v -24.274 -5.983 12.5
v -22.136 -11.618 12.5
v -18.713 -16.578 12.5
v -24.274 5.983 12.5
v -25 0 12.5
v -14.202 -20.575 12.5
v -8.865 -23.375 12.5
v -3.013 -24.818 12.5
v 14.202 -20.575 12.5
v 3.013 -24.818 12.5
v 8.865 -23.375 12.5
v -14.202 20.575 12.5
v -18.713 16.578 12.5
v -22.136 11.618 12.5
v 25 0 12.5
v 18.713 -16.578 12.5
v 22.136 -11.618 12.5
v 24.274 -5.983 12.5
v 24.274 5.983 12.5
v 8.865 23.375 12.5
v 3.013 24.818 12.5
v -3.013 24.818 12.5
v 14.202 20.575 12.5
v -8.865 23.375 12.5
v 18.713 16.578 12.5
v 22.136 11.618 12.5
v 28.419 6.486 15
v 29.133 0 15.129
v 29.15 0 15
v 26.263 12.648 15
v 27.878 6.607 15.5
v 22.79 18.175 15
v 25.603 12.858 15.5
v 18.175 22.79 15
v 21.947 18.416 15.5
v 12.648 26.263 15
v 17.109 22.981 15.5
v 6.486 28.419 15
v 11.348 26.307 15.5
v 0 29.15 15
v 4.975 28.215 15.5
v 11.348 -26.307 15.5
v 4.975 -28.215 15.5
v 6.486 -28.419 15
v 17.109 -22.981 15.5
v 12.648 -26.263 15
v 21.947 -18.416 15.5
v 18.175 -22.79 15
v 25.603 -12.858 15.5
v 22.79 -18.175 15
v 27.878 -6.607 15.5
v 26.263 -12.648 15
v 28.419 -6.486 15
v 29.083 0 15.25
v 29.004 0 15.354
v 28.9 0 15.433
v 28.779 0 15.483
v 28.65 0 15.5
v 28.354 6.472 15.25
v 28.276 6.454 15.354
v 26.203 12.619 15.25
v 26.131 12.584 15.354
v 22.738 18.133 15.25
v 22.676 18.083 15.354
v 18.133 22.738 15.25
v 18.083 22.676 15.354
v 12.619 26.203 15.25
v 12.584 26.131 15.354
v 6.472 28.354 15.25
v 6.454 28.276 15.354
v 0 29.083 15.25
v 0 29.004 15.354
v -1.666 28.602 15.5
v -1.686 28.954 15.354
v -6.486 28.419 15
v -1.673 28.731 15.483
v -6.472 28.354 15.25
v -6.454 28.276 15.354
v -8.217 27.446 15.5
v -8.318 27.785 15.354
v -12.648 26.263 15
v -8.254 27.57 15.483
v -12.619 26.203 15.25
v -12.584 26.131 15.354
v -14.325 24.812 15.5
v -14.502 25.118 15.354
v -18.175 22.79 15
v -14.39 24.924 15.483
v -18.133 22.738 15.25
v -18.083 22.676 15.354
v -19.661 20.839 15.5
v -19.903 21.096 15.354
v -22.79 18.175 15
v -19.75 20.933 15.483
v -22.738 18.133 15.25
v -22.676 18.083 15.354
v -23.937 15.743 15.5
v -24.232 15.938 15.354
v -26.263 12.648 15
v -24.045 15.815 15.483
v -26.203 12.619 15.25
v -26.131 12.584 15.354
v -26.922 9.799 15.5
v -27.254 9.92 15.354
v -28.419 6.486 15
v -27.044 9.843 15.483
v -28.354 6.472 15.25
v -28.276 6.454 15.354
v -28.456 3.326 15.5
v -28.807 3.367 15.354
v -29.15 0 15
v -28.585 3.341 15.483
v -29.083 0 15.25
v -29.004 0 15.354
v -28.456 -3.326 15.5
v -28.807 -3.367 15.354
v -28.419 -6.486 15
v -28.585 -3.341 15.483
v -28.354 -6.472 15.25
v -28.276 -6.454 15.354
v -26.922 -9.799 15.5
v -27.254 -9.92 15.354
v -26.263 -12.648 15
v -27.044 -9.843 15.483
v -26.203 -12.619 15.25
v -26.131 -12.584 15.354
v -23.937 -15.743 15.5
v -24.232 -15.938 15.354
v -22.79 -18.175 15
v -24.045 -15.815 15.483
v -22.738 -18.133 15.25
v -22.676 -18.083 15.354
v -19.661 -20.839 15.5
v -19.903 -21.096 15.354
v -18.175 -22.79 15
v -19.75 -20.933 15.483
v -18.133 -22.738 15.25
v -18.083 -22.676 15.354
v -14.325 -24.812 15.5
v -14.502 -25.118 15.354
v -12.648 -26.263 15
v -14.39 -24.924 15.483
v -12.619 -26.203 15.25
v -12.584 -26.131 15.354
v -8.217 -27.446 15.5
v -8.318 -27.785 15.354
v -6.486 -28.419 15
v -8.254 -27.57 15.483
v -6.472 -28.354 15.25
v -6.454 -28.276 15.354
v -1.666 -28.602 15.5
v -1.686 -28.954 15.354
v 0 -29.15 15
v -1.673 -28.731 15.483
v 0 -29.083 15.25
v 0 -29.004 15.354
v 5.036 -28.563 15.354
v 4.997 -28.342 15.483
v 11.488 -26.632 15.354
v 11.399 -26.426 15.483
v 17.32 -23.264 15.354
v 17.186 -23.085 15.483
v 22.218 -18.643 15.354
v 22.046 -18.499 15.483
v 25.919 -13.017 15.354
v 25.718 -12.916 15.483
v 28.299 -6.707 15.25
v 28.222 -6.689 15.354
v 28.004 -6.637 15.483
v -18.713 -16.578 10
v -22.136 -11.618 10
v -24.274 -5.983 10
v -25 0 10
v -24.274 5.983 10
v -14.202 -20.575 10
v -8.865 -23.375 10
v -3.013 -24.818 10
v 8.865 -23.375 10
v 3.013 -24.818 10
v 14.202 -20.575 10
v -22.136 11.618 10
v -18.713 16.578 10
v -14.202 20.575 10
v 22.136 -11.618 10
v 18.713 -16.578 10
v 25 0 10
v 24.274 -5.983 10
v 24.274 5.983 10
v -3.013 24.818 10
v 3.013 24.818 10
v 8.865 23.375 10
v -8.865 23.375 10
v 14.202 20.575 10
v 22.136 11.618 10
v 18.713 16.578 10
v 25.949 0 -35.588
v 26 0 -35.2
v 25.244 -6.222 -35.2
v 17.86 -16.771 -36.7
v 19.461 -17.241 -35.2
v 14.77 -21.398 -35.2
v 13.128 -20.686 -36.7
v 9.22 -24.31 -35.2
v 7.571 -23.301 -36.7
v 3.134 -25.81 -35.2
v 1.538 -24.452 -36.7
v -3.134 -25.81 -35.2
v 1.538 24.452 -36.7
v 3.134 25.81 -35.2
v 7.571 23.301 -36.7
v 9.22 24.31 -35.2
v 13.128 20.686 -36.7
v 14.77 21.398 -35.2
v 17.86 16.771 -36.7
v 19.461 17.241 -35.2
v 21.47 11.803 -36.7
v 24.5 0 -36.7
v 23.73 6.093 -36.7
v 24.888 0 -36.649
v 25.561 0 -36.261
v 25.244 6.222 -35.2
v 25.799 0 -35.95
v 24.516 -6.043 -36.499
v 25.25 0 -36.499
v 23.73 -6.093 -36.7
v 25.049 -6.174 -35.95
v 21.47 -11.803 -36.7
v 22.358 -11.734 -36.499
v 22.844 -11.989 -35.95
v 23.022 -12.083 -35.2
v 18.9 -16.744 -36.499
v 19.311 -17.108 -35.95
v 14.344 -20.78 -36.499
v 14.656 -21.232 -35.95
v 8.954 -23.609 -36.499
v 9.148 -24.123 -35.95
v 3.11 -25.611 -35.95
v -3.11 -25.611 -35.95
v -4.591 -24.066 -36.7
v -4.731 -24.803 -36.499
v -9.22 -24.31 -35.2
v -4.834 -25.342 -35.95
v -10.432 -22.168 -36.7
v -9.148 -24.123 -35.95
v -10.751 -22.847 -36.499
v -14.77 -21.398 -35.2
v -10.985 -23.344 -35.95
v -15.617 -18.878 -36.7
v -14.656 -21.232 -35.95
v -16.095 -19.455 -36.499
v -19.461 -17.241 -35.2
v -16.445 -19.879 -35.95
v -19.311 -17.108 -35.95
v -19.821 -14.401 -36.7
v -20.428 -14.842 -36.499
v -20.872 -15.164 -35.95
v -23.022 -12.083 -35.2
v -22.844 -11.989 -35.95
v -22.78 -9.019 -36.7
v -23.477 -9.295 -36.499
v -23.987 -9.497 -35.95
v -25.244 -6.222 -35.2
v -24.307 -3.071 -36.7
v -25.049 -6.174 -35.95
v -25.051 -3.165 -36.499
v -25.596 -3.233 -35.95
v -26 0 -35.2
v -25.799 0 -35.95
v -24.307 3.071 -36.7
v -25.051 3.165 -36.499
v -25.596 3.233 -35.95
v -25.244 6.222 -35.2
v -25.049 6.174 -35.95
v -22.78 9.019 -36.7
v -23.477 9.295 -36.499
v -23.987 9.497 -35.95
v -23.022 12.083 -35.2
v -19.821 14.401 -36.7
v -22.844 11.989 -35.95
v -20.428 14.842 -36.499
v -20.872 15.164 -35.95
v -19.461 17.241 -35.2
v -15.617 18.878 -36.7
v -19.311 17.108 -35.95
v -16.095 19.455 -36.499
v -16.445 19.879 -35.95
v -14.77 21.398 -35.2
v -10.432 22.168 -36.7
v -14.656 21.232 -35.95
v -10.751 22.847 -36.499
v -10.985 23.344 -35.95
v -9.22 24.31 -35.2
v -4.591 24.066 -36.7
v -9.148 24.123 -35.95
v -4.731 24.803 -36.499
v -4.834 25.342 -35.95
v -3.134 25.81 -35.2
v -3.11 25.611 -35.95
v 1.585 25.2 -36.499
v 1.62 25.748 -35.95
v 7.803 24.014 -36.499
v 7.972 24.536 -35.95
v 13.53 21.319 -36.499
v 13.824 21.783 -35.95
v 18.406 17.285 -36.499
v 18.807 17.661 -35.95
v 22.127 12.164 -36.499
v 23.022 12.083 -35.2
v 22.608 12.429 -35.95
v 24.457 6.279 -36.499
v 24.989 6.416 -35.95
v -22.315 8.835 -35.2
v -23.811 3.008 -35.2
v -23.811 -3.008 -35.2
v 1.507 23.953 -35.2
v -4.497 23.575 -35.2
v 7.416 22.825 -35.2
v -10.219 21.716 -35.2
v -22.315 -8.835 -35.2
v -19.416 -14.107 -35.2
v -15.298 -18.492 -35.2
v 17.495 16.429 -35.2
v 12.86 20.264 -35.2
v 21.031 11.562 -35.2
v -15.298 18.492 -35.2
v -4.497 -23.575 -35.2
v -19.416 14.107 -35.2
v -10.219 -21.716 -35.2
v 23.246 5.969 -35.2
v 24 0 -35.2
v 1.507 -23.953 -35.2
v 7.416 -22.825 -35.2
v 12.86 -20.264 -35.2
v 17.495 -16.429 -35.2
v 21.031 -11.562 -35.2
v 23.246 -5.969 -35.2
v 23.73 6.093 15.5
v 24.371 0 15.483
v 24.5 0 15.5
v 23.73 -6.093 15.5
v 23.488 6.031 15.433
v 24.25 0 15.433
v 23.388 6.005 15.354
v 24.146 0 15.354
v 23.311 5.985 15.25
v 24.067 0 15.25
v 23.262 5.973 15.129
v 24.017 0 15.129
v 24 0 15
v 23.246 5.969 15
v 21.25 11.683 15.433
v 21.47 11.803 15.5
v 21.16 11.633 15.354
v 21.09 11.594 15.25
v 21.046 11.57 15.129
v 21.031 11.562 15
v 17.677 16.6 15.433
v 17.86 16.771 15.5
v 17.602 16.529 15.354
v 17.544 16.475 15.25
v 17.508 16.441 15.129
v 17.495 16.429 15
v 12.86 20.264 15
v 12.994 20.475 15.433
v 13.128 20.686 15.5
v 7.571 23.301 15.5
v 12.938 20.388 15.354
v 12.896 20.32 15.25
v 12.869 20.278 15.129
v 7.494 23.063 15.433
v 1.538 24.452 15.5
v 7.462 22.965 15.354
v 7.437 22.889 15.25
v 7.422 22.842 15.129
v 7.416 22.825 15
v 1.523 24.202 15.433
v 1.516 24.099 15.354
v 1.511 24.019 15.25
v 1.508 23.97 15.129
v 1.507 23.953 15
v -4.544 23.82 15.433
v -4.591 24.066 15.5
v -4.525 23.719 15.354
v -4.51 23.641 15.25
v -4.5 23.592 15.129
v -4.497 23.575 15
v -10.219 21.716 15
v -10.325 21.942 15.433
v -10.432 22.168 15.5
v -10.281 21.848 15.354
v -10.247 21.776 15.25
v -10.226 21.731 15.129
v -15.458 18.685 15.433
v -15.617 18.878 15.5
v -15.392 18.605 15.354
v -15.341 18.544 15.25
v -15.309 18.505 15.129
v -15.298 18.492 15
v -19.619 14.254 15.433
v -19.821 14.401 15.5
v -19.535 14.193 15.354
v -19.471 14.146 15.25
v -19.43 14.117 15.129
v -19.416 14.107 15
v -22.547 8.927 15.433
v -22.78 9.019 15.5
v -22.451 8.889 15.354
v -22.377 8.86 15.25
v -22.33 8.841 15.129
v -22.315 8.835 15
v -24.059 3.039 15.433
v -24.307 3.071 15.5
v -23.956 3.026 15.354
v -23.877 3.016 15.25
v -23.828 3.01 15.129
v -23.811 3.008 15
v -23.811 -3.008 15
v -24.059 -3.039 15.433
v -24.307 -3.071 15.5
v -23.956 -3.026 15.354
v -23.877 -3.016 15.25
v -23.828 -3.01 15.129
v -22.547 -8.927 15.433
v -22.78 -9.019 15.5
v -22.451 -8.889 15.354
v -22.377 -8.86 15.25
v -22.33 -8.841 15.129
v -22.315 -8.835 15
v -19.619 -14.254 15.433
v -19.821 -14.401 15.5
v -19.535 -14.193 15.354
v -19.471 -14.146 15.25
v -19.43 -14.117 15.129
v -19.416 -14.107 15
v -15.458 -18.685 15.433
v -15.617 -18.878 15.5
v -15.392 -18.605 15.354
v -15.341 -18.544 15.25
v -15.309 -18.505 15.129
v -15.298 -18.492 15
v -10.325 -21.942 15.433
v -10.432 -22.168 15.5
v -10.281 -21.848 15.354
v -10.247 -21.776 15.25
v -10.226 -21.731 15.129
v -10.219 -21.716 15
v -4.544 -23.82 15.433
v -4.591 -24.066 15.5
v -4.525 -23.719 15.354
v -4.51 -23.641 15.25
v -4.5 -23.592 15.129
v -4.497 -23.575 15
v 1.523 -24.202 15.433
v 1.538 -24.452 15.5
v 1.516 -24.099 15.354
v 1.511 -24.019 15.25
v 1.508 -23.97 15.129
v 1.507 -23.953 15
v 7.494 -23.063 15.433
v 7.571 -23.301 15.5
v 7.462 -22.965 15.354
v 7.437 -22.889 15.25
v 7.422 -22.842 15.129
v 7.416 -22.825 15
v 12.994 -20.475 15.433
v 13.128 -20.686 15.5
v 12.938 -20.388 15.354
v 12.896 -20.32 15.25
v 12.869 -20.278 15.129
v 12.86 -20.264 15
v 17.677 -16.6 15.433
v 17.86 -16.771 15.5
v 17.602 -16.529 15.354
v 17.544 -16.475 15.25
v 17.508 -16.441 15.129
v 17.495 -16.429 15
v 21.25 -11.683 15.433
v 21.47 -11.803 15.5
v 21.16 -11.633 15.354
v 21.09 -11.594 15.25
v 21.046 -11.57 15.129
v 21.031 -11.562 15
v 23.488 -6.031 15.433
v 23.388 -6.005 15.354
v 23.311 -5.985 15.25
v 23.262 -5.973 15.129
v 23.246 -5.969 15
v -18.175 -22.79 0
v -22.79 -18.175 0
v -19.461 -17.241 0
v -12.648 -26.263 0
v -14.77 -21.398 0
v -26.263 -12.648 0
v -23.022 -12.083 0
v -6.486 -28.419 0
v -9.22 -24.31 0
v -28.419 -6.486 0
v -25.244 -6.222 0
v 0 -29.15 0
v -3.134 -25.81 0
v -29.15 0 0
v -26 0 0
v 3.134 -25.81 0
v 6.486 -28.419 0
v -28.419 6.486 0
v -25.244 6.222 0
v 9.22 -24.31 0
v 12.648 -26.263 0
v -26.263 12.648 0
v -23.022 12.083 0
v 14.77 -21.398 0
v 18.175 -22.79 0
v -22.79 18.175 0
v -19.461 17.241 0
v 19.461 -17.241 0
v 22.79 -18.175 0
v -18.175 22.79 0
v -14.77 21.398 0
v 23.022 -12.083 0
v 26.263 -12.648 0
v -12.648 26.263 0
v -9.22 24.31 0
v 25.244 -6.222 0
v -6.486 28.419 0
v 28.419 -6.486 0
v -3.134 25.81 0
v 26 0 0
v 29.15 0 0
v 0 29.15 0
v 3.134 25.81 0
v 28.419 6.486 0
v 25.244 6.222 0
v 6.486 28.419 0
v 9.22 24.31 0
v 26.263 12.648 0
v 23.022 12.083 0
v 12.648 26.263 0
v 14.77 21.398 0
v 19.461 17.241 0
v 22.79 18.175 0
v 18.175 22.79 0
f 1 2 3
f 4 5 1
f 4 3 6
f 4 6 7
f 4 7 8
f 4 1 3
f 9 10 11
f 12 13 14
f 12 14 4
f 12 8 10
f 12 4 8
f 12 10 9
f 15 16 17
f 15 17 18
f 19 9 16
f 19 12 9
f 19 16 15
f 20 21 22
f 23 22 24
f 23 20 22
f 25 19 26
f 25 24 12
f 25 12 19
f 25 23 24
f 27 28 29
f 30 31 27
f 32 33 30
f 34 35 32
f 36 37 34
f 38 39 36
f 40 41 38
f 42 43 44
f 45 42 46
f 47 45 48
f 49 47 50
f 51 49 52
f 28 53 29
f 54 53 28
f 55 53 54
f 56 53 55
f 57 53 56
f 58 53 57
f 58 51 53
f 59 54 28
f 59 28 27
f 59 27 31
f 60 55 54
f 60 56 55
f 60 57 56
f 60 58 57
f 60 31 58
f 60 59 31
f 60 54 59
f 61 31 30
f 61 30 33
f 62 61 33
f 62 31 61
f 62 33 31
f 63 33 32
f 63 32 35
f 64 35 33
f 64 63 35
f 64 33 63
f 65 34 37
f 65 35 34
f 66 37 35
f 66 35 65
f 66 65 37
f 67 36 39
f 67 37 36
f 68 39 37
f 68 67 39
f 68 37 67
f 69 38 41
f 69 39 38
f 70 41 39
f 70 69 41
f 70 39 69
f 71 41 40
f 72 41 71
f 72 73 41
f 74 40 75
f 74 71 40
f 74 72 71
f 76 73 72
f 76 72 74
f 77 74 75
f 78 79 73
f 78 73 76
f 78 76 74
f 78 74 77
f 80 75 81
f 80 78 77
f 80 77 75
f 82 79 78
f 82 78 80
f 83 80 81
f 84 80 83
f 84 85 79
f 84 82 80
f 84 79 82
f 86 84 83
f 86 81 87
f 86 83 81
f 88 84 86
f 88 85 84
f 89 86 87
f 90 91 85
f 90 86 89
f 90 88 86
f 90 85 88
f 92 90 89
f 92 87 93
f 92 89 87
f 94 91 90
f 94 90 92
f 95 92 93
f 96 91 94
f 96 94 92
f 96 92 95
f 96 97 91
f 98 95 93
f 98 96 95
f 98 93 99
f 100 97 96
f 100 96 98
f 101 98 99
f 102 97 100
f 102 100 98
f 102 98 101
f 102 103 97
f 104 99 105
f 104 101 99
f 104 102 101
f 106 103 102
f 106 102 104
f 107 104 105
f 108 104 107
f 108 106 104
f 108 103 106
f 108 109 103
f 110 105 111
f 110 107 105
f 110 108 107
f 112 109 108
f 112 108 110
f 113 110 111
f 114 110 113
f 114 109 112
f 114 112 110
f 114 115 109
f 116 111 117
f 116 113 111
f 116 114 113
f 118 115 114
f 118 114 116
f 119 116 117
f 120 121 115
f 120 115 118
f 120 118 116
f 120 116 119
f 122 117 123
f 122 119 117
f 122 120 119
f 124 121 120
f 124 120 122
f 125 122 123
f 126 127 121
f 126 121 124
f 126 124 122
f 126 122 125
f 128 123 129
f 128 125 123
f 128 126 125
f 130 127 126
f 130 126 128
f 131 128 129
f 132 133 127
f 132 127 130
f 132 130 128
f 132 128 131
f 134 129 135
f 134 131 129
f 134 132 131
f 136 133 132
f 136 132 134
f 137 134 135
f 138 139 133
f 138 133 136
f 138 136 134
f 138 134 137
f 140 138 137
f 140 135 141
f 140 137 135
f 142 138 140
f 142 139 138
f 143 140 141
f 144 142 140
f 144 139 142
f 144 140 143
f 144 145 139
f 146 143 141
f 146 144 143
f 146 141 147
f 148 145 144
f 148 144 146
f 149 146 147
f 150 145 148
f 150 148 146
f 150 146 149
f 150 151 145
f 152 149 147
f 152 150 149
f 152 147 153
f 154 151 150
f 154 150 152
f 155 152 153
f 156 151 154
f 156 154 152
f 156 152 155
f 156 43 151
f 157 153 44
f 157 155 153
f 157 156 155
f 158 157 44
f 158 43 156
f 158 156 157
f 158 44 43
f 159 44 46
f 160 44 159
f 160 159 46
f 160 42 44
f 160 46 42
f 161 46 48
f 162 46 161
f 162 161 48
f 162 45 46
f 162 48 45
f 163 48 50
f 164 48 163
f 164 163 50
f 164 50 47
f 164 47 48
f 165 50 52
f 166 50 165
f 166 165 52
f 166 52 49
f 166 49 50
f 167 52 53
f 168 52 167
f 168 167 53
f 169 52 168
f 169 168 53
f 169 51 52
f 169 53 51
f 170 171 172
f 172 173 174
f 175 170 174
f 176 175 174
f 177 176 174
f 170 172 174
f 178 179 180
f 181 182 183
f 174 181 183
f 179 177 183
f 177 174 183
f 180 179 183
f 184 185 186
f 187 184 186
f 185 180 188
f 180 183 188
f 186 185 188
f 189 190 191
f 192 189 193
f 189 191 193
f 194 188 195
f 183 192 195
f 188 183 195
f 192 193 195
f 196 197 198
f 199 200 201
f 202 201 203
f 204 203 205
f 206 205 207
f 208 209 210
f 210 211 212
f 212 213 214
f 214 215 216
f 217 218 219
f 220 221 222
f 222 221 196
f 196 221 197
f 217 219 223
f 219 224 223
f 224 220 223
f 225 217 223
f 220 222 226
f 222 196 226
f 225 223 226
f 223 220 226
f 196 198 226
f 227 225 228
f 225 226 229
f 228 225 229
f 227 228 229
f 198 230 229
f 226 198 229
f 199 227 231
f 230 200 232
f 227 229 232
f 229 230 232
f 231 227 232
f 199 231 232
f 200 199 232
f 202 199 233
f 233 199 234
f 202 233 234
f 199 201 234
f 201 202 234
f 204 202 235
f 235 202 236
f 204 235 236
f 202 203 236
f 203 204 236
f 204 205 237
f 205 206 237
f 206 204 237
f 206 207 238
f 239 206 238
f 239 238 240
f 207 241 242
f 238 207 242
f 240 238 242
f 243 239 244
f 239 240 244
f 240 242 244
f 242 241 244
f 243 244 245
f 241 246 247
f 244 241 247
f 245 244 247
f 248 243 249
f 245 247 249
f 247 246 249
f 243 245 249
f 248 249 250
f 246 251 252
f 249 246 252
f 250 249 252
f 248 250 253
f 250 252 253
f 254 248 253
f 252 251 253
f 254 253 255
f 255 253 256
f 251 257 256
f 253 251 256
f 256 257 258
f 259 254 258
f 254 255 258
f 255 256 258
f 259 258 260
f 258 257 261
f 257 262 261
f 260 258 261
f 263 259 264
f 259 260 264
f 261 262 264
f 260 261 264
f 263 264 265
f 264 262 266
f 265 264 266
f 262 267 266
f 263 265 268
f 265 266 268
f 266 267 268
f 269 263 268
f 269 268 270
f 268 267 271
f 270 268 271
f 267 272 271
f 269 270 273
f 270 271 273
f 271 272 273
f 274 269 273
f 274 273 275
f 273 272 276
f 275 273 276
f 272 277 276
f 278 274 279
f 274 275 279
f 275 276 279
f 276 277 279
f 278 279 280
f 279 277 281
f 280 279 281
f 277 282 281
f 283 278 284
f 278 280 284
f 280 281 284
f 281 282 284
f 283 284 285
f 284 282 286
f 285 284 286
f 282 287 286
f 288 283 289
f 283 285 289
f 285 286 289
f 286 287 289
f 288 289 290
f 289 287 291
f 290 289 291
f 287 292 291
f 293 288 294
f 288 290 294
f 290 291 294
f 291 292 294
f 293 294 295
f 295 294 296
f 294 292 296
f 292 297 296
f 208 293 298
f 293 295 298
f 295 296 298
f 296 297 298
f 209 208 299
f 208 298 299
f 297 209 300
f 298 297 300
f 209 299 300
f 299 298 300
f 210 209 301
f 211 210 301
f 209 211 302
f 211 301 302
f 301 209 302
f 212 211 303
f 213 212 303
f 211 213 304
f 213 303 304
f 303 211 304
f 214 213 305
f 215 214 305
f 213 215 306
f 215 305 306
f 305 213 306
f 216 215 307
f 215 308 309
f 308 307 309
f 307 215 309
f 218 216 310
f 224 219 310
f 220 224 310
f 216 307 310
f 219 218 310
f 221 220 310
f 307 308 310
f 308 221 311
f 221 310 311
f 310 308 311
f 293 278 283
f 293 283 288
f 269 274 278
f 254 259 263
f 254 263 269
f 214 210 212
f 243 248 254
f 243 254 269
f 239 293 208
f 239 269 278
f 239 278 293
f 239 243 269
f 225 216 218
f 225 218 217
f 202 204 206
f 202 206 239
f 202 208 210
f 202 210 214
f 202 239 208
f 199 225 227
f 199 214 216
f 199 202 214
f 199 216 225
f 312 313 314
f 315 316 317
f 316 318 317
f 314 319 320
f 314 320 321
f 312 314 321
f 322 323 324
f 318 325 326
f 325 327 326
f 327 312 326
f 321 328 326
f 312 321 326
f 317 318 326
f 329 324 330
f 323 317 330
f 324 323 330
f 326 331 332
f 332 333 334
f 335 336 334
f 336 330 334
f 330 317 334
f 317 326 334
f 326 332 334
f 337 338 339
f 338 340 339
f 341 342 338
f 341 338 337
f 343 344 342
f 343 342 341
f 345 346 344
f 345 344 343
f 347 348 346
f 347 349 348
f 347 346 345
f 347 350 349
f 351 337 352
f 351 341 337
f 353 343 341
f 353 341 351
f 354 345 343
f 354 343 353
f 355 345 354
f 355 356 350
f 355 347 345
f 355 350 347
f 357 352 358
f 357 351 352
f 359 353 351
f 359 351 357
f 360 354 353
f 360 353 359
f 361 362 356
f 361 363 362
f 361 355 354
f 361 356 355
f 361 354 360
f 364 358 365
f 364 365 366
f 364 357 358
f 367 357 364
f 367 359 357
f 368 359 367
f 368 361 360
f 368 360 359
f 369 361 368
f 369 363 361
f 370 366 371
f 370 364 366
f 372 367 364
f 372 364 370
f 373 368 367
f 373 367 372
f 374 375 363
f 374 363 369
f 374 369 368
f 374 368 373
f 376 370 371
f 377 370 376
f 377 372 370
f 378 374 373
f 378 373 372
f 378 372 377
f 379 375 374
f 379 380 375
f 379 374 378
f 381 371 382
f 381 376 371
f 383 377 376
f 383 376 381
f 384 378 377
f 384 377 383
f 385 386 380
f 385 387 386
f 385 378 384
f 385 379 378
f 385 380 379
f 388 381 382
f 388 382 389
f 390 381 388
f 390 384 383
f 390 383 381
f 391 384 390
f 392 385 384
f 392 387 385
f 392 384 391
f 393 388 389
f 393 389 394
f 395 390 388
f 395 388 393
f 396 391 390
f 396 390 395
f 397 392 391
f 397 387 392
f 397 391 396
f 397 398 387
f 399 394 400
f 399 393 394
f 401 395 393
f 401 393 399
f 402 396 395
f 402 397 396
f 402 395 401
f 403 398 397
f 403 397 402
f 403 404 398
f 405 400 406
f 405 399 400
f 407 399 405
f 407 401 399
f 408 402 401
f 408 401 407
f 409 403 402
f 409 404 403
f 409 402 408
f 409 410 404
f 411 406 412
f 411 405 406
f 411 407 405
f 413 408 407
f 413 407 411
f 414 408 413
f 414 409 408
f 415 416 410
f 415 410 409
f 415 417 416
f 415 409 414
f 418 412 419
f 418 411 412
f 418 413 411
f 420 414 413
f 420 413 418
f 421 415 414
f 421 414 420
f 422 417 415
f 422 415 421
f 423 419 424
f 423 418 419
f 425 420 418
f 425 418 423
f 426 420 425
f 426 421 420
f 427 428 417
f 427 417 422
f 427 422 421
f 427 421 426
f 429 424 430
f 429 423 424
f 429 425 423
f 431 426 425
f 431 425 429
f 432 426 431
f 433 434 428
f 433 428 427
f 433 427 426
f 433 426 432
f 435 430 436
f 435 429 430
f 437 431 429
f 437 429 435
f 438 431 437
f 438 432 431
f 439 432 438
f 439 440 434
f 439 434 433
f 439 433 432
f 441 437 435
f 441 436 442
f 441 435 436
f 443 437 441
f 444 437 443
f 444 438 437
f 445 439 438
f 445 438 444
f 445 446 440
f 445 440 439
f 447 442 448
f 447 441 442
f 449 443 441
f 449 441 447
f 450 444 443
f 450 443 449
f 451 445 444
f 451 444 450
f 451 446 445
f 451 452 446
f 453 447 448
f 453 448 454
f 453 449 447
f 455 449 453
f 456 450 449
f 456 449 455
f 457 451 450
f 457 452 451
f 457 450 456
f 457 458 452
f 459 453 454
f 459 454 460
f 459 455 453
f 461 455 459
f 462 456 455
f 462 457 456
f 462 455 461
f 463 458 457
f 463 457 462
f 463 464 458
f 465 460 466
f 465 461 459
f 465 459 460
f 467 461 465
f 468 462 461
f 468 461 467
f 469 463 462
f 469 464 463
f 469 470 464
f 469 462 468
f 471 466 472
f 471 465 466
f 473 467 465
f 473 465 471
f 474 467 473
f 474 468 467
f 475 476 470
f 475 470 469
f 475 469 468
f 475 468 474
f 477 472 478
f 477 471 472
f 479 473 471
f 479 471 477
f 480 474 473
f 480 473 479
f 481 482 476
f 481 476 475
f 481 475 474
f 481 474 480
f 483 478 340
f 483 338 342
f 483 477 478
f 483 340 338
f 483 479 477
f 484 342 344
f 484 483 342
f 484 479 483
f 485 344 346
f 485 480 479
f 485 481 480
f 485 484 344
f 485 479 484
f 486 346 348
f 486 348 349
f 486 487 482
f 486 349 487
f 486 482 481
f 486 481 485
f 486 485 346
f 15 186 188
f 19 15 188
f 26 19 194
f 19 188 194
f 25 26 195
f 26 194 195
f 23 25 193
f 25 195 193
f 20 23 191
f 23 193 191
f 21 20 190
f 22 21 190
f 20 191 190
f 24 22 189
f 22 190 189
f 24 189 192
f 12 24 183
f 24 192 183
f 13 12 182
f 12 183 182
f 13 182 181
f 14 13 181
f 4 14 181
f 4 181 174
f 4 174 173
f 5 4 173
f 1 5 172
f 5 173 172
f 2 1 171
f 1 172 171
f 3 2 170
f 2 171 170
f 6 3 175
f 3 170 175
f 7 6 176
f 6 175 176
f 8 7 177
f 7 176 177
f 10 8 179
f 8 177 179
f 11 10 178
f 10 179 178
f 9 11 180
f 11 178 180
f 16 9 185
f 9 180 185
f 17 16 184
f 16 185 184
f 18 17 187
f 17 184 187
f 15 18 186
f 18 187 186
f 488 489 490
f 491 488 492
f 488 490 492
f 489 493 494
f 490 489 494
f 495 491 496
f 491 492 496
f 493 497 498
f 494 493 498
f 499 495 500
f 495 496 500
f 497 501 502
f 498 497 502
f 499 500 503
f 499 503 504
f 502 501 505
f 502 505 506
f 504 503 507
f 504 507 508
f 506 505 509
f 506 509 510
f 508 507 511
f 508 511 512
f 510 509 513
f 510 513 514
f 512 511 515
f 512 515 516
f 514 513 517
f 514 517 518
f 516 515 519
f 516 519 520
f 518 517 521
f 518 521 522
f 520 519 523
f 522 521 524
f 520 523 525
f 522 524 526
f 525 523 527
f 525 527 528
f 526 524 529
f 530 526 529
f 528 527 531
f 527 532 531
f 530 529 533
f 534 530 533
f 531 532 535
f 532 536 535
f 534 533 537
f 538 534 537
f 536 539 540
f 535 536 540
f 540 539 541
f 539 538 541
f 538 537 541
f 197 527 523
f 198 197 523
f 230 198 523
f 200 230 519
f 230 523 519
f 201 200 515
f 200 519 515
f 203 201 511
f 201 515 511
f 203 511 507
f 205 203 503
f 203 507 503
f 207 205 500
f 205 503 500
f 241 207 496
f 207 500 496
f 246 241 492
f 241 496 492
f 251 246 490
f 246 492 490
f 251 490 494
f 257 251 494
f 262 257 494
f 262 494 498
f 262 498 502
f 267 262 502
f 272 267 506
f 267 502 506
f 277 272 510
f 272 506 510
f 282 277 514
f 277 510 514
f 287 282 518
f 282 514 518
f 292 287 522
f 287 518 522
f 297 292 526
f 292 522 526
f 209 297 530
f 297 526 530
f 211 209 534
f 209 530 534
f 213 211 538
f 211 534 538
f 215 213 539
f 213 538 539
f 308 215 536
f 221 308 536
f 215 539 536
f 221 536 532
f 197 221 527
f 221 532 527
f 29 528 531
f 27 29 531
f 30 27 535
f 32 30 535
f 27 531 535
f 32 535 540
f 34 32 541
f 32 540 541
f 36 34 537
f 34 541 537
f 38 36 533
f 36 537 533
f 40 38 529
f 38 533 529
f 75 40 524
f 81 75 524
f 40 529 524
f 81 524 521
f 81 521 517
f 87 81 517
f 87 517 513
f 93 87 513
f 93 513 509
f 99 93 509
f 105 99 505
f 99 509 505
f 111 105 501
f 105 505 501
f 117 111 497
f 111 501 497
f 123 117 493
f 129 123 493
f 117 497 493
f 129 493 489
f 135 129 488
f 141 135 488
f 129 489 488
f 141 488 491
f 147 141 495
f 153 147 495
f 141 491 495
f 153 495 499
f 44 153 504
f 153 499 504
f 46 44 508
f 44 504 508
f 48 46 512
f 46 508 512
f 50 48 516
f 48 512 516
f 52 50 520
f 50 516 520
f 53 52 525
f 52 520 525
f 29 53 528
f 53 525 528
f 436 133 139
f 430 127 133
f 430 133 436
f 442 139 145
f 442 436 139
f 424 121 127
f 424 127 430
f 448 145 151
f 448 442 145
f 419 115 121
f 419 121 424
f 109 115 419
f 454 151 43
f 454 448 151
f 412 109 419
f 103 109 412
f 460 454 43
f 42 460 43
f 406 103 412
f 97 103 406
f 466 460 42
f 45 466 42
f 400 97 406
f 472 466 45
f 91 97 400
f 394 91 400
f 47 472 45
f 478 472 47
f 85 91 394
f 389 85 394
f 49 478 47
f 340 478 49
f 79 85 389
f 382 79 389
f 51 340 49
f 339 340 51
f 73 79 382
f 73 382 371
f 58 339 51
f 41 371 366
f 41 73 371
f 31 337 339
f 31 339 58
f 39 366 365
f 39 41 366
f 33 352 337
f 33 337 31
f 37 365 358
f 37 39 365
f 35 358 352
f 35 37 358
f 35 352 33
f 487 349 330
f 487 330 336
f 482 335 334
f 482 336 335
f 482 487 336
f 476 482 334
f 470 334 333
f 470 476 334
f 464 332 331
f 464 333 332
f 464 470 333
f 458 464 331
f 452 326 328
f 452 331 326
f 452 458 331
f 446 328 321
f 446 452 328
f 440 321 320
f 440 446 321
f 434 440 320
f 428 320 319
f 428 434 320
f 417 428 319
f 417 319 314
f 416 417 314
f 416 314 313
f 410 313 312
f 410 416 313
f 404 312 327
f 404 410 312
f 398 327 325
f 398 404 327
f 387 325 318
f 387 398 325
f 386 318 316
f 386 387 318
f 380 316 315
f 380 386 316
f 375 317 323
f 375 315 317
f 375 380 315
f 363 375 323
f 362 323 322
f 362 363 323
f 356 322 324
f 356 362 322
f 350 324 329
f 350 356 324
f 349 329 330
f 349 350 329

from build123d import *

# Parameters (mm, degrees)
F0_R     = 29.15
F0_R_2   = 24
F1_DEPTH = 15.5
F3_R     = 25
F4_DEPTH = 2.5
F5_R     = 26
F5_R_2   = 24
F6_DEPTH = 36.7
F7_R     = 25.5
F8_DEPTH = 1.5
F9_R     = 1.5
F10_R    = 0.5


with BuildPart() as f1:
    # F0 (on Top) → F1 (new body)
    with BuildSketch(Plane.XY):
        Circle(F0_R)
        Circle(F0_R_2, mode=Mode.SUBTRACT)
    extrude(amount=F1_DEPTH)

    # F5 (on face) → F6 (join)
    with BuildSketch(Plane(origin=(0, 0, 0), x_dir=(1, 0, 0), z_dir=(0, 0, -1))):
        Circle(F5_R)
        Circle(F5_R_2, mode=Mode.SUBTRACT)
    extrude(amount=F6_DEPTH)

    # F7 (on face) → F8 (join)
    with BuildSketch(Plane(origin=(0, 0, -36.7), x_dir=(1, 0, 0), z_dir=(0, 0, -1))):
        Circle(F7_R)
    extrude(amount=-F8_DEPTH)

    # F9
    f9_edges = [f1.edges().sort_by_distance(p)[0] for p in [
        (-26, 0, -36.7),
    ]]
    fillet(f9_edges, radius=F9_R)

    # F10
    f10_edges = [f1.edges().sort_by_distance(p)[0] for p in [
        (-29.15, 0, 15.5),
        (-24, 0, 15.5),
    ]]
    fillet(f10_edges, radius=F10_R)


with BuildPart() as f4:
    # F3 (on offset) → F4 (new body)
    with BuildSketch(Plane.XY.offset(10)):
        Circle(F3_R)
    extrude(amount=F4_DEPTH)


solid = Compound([f1.part, f4.part])
